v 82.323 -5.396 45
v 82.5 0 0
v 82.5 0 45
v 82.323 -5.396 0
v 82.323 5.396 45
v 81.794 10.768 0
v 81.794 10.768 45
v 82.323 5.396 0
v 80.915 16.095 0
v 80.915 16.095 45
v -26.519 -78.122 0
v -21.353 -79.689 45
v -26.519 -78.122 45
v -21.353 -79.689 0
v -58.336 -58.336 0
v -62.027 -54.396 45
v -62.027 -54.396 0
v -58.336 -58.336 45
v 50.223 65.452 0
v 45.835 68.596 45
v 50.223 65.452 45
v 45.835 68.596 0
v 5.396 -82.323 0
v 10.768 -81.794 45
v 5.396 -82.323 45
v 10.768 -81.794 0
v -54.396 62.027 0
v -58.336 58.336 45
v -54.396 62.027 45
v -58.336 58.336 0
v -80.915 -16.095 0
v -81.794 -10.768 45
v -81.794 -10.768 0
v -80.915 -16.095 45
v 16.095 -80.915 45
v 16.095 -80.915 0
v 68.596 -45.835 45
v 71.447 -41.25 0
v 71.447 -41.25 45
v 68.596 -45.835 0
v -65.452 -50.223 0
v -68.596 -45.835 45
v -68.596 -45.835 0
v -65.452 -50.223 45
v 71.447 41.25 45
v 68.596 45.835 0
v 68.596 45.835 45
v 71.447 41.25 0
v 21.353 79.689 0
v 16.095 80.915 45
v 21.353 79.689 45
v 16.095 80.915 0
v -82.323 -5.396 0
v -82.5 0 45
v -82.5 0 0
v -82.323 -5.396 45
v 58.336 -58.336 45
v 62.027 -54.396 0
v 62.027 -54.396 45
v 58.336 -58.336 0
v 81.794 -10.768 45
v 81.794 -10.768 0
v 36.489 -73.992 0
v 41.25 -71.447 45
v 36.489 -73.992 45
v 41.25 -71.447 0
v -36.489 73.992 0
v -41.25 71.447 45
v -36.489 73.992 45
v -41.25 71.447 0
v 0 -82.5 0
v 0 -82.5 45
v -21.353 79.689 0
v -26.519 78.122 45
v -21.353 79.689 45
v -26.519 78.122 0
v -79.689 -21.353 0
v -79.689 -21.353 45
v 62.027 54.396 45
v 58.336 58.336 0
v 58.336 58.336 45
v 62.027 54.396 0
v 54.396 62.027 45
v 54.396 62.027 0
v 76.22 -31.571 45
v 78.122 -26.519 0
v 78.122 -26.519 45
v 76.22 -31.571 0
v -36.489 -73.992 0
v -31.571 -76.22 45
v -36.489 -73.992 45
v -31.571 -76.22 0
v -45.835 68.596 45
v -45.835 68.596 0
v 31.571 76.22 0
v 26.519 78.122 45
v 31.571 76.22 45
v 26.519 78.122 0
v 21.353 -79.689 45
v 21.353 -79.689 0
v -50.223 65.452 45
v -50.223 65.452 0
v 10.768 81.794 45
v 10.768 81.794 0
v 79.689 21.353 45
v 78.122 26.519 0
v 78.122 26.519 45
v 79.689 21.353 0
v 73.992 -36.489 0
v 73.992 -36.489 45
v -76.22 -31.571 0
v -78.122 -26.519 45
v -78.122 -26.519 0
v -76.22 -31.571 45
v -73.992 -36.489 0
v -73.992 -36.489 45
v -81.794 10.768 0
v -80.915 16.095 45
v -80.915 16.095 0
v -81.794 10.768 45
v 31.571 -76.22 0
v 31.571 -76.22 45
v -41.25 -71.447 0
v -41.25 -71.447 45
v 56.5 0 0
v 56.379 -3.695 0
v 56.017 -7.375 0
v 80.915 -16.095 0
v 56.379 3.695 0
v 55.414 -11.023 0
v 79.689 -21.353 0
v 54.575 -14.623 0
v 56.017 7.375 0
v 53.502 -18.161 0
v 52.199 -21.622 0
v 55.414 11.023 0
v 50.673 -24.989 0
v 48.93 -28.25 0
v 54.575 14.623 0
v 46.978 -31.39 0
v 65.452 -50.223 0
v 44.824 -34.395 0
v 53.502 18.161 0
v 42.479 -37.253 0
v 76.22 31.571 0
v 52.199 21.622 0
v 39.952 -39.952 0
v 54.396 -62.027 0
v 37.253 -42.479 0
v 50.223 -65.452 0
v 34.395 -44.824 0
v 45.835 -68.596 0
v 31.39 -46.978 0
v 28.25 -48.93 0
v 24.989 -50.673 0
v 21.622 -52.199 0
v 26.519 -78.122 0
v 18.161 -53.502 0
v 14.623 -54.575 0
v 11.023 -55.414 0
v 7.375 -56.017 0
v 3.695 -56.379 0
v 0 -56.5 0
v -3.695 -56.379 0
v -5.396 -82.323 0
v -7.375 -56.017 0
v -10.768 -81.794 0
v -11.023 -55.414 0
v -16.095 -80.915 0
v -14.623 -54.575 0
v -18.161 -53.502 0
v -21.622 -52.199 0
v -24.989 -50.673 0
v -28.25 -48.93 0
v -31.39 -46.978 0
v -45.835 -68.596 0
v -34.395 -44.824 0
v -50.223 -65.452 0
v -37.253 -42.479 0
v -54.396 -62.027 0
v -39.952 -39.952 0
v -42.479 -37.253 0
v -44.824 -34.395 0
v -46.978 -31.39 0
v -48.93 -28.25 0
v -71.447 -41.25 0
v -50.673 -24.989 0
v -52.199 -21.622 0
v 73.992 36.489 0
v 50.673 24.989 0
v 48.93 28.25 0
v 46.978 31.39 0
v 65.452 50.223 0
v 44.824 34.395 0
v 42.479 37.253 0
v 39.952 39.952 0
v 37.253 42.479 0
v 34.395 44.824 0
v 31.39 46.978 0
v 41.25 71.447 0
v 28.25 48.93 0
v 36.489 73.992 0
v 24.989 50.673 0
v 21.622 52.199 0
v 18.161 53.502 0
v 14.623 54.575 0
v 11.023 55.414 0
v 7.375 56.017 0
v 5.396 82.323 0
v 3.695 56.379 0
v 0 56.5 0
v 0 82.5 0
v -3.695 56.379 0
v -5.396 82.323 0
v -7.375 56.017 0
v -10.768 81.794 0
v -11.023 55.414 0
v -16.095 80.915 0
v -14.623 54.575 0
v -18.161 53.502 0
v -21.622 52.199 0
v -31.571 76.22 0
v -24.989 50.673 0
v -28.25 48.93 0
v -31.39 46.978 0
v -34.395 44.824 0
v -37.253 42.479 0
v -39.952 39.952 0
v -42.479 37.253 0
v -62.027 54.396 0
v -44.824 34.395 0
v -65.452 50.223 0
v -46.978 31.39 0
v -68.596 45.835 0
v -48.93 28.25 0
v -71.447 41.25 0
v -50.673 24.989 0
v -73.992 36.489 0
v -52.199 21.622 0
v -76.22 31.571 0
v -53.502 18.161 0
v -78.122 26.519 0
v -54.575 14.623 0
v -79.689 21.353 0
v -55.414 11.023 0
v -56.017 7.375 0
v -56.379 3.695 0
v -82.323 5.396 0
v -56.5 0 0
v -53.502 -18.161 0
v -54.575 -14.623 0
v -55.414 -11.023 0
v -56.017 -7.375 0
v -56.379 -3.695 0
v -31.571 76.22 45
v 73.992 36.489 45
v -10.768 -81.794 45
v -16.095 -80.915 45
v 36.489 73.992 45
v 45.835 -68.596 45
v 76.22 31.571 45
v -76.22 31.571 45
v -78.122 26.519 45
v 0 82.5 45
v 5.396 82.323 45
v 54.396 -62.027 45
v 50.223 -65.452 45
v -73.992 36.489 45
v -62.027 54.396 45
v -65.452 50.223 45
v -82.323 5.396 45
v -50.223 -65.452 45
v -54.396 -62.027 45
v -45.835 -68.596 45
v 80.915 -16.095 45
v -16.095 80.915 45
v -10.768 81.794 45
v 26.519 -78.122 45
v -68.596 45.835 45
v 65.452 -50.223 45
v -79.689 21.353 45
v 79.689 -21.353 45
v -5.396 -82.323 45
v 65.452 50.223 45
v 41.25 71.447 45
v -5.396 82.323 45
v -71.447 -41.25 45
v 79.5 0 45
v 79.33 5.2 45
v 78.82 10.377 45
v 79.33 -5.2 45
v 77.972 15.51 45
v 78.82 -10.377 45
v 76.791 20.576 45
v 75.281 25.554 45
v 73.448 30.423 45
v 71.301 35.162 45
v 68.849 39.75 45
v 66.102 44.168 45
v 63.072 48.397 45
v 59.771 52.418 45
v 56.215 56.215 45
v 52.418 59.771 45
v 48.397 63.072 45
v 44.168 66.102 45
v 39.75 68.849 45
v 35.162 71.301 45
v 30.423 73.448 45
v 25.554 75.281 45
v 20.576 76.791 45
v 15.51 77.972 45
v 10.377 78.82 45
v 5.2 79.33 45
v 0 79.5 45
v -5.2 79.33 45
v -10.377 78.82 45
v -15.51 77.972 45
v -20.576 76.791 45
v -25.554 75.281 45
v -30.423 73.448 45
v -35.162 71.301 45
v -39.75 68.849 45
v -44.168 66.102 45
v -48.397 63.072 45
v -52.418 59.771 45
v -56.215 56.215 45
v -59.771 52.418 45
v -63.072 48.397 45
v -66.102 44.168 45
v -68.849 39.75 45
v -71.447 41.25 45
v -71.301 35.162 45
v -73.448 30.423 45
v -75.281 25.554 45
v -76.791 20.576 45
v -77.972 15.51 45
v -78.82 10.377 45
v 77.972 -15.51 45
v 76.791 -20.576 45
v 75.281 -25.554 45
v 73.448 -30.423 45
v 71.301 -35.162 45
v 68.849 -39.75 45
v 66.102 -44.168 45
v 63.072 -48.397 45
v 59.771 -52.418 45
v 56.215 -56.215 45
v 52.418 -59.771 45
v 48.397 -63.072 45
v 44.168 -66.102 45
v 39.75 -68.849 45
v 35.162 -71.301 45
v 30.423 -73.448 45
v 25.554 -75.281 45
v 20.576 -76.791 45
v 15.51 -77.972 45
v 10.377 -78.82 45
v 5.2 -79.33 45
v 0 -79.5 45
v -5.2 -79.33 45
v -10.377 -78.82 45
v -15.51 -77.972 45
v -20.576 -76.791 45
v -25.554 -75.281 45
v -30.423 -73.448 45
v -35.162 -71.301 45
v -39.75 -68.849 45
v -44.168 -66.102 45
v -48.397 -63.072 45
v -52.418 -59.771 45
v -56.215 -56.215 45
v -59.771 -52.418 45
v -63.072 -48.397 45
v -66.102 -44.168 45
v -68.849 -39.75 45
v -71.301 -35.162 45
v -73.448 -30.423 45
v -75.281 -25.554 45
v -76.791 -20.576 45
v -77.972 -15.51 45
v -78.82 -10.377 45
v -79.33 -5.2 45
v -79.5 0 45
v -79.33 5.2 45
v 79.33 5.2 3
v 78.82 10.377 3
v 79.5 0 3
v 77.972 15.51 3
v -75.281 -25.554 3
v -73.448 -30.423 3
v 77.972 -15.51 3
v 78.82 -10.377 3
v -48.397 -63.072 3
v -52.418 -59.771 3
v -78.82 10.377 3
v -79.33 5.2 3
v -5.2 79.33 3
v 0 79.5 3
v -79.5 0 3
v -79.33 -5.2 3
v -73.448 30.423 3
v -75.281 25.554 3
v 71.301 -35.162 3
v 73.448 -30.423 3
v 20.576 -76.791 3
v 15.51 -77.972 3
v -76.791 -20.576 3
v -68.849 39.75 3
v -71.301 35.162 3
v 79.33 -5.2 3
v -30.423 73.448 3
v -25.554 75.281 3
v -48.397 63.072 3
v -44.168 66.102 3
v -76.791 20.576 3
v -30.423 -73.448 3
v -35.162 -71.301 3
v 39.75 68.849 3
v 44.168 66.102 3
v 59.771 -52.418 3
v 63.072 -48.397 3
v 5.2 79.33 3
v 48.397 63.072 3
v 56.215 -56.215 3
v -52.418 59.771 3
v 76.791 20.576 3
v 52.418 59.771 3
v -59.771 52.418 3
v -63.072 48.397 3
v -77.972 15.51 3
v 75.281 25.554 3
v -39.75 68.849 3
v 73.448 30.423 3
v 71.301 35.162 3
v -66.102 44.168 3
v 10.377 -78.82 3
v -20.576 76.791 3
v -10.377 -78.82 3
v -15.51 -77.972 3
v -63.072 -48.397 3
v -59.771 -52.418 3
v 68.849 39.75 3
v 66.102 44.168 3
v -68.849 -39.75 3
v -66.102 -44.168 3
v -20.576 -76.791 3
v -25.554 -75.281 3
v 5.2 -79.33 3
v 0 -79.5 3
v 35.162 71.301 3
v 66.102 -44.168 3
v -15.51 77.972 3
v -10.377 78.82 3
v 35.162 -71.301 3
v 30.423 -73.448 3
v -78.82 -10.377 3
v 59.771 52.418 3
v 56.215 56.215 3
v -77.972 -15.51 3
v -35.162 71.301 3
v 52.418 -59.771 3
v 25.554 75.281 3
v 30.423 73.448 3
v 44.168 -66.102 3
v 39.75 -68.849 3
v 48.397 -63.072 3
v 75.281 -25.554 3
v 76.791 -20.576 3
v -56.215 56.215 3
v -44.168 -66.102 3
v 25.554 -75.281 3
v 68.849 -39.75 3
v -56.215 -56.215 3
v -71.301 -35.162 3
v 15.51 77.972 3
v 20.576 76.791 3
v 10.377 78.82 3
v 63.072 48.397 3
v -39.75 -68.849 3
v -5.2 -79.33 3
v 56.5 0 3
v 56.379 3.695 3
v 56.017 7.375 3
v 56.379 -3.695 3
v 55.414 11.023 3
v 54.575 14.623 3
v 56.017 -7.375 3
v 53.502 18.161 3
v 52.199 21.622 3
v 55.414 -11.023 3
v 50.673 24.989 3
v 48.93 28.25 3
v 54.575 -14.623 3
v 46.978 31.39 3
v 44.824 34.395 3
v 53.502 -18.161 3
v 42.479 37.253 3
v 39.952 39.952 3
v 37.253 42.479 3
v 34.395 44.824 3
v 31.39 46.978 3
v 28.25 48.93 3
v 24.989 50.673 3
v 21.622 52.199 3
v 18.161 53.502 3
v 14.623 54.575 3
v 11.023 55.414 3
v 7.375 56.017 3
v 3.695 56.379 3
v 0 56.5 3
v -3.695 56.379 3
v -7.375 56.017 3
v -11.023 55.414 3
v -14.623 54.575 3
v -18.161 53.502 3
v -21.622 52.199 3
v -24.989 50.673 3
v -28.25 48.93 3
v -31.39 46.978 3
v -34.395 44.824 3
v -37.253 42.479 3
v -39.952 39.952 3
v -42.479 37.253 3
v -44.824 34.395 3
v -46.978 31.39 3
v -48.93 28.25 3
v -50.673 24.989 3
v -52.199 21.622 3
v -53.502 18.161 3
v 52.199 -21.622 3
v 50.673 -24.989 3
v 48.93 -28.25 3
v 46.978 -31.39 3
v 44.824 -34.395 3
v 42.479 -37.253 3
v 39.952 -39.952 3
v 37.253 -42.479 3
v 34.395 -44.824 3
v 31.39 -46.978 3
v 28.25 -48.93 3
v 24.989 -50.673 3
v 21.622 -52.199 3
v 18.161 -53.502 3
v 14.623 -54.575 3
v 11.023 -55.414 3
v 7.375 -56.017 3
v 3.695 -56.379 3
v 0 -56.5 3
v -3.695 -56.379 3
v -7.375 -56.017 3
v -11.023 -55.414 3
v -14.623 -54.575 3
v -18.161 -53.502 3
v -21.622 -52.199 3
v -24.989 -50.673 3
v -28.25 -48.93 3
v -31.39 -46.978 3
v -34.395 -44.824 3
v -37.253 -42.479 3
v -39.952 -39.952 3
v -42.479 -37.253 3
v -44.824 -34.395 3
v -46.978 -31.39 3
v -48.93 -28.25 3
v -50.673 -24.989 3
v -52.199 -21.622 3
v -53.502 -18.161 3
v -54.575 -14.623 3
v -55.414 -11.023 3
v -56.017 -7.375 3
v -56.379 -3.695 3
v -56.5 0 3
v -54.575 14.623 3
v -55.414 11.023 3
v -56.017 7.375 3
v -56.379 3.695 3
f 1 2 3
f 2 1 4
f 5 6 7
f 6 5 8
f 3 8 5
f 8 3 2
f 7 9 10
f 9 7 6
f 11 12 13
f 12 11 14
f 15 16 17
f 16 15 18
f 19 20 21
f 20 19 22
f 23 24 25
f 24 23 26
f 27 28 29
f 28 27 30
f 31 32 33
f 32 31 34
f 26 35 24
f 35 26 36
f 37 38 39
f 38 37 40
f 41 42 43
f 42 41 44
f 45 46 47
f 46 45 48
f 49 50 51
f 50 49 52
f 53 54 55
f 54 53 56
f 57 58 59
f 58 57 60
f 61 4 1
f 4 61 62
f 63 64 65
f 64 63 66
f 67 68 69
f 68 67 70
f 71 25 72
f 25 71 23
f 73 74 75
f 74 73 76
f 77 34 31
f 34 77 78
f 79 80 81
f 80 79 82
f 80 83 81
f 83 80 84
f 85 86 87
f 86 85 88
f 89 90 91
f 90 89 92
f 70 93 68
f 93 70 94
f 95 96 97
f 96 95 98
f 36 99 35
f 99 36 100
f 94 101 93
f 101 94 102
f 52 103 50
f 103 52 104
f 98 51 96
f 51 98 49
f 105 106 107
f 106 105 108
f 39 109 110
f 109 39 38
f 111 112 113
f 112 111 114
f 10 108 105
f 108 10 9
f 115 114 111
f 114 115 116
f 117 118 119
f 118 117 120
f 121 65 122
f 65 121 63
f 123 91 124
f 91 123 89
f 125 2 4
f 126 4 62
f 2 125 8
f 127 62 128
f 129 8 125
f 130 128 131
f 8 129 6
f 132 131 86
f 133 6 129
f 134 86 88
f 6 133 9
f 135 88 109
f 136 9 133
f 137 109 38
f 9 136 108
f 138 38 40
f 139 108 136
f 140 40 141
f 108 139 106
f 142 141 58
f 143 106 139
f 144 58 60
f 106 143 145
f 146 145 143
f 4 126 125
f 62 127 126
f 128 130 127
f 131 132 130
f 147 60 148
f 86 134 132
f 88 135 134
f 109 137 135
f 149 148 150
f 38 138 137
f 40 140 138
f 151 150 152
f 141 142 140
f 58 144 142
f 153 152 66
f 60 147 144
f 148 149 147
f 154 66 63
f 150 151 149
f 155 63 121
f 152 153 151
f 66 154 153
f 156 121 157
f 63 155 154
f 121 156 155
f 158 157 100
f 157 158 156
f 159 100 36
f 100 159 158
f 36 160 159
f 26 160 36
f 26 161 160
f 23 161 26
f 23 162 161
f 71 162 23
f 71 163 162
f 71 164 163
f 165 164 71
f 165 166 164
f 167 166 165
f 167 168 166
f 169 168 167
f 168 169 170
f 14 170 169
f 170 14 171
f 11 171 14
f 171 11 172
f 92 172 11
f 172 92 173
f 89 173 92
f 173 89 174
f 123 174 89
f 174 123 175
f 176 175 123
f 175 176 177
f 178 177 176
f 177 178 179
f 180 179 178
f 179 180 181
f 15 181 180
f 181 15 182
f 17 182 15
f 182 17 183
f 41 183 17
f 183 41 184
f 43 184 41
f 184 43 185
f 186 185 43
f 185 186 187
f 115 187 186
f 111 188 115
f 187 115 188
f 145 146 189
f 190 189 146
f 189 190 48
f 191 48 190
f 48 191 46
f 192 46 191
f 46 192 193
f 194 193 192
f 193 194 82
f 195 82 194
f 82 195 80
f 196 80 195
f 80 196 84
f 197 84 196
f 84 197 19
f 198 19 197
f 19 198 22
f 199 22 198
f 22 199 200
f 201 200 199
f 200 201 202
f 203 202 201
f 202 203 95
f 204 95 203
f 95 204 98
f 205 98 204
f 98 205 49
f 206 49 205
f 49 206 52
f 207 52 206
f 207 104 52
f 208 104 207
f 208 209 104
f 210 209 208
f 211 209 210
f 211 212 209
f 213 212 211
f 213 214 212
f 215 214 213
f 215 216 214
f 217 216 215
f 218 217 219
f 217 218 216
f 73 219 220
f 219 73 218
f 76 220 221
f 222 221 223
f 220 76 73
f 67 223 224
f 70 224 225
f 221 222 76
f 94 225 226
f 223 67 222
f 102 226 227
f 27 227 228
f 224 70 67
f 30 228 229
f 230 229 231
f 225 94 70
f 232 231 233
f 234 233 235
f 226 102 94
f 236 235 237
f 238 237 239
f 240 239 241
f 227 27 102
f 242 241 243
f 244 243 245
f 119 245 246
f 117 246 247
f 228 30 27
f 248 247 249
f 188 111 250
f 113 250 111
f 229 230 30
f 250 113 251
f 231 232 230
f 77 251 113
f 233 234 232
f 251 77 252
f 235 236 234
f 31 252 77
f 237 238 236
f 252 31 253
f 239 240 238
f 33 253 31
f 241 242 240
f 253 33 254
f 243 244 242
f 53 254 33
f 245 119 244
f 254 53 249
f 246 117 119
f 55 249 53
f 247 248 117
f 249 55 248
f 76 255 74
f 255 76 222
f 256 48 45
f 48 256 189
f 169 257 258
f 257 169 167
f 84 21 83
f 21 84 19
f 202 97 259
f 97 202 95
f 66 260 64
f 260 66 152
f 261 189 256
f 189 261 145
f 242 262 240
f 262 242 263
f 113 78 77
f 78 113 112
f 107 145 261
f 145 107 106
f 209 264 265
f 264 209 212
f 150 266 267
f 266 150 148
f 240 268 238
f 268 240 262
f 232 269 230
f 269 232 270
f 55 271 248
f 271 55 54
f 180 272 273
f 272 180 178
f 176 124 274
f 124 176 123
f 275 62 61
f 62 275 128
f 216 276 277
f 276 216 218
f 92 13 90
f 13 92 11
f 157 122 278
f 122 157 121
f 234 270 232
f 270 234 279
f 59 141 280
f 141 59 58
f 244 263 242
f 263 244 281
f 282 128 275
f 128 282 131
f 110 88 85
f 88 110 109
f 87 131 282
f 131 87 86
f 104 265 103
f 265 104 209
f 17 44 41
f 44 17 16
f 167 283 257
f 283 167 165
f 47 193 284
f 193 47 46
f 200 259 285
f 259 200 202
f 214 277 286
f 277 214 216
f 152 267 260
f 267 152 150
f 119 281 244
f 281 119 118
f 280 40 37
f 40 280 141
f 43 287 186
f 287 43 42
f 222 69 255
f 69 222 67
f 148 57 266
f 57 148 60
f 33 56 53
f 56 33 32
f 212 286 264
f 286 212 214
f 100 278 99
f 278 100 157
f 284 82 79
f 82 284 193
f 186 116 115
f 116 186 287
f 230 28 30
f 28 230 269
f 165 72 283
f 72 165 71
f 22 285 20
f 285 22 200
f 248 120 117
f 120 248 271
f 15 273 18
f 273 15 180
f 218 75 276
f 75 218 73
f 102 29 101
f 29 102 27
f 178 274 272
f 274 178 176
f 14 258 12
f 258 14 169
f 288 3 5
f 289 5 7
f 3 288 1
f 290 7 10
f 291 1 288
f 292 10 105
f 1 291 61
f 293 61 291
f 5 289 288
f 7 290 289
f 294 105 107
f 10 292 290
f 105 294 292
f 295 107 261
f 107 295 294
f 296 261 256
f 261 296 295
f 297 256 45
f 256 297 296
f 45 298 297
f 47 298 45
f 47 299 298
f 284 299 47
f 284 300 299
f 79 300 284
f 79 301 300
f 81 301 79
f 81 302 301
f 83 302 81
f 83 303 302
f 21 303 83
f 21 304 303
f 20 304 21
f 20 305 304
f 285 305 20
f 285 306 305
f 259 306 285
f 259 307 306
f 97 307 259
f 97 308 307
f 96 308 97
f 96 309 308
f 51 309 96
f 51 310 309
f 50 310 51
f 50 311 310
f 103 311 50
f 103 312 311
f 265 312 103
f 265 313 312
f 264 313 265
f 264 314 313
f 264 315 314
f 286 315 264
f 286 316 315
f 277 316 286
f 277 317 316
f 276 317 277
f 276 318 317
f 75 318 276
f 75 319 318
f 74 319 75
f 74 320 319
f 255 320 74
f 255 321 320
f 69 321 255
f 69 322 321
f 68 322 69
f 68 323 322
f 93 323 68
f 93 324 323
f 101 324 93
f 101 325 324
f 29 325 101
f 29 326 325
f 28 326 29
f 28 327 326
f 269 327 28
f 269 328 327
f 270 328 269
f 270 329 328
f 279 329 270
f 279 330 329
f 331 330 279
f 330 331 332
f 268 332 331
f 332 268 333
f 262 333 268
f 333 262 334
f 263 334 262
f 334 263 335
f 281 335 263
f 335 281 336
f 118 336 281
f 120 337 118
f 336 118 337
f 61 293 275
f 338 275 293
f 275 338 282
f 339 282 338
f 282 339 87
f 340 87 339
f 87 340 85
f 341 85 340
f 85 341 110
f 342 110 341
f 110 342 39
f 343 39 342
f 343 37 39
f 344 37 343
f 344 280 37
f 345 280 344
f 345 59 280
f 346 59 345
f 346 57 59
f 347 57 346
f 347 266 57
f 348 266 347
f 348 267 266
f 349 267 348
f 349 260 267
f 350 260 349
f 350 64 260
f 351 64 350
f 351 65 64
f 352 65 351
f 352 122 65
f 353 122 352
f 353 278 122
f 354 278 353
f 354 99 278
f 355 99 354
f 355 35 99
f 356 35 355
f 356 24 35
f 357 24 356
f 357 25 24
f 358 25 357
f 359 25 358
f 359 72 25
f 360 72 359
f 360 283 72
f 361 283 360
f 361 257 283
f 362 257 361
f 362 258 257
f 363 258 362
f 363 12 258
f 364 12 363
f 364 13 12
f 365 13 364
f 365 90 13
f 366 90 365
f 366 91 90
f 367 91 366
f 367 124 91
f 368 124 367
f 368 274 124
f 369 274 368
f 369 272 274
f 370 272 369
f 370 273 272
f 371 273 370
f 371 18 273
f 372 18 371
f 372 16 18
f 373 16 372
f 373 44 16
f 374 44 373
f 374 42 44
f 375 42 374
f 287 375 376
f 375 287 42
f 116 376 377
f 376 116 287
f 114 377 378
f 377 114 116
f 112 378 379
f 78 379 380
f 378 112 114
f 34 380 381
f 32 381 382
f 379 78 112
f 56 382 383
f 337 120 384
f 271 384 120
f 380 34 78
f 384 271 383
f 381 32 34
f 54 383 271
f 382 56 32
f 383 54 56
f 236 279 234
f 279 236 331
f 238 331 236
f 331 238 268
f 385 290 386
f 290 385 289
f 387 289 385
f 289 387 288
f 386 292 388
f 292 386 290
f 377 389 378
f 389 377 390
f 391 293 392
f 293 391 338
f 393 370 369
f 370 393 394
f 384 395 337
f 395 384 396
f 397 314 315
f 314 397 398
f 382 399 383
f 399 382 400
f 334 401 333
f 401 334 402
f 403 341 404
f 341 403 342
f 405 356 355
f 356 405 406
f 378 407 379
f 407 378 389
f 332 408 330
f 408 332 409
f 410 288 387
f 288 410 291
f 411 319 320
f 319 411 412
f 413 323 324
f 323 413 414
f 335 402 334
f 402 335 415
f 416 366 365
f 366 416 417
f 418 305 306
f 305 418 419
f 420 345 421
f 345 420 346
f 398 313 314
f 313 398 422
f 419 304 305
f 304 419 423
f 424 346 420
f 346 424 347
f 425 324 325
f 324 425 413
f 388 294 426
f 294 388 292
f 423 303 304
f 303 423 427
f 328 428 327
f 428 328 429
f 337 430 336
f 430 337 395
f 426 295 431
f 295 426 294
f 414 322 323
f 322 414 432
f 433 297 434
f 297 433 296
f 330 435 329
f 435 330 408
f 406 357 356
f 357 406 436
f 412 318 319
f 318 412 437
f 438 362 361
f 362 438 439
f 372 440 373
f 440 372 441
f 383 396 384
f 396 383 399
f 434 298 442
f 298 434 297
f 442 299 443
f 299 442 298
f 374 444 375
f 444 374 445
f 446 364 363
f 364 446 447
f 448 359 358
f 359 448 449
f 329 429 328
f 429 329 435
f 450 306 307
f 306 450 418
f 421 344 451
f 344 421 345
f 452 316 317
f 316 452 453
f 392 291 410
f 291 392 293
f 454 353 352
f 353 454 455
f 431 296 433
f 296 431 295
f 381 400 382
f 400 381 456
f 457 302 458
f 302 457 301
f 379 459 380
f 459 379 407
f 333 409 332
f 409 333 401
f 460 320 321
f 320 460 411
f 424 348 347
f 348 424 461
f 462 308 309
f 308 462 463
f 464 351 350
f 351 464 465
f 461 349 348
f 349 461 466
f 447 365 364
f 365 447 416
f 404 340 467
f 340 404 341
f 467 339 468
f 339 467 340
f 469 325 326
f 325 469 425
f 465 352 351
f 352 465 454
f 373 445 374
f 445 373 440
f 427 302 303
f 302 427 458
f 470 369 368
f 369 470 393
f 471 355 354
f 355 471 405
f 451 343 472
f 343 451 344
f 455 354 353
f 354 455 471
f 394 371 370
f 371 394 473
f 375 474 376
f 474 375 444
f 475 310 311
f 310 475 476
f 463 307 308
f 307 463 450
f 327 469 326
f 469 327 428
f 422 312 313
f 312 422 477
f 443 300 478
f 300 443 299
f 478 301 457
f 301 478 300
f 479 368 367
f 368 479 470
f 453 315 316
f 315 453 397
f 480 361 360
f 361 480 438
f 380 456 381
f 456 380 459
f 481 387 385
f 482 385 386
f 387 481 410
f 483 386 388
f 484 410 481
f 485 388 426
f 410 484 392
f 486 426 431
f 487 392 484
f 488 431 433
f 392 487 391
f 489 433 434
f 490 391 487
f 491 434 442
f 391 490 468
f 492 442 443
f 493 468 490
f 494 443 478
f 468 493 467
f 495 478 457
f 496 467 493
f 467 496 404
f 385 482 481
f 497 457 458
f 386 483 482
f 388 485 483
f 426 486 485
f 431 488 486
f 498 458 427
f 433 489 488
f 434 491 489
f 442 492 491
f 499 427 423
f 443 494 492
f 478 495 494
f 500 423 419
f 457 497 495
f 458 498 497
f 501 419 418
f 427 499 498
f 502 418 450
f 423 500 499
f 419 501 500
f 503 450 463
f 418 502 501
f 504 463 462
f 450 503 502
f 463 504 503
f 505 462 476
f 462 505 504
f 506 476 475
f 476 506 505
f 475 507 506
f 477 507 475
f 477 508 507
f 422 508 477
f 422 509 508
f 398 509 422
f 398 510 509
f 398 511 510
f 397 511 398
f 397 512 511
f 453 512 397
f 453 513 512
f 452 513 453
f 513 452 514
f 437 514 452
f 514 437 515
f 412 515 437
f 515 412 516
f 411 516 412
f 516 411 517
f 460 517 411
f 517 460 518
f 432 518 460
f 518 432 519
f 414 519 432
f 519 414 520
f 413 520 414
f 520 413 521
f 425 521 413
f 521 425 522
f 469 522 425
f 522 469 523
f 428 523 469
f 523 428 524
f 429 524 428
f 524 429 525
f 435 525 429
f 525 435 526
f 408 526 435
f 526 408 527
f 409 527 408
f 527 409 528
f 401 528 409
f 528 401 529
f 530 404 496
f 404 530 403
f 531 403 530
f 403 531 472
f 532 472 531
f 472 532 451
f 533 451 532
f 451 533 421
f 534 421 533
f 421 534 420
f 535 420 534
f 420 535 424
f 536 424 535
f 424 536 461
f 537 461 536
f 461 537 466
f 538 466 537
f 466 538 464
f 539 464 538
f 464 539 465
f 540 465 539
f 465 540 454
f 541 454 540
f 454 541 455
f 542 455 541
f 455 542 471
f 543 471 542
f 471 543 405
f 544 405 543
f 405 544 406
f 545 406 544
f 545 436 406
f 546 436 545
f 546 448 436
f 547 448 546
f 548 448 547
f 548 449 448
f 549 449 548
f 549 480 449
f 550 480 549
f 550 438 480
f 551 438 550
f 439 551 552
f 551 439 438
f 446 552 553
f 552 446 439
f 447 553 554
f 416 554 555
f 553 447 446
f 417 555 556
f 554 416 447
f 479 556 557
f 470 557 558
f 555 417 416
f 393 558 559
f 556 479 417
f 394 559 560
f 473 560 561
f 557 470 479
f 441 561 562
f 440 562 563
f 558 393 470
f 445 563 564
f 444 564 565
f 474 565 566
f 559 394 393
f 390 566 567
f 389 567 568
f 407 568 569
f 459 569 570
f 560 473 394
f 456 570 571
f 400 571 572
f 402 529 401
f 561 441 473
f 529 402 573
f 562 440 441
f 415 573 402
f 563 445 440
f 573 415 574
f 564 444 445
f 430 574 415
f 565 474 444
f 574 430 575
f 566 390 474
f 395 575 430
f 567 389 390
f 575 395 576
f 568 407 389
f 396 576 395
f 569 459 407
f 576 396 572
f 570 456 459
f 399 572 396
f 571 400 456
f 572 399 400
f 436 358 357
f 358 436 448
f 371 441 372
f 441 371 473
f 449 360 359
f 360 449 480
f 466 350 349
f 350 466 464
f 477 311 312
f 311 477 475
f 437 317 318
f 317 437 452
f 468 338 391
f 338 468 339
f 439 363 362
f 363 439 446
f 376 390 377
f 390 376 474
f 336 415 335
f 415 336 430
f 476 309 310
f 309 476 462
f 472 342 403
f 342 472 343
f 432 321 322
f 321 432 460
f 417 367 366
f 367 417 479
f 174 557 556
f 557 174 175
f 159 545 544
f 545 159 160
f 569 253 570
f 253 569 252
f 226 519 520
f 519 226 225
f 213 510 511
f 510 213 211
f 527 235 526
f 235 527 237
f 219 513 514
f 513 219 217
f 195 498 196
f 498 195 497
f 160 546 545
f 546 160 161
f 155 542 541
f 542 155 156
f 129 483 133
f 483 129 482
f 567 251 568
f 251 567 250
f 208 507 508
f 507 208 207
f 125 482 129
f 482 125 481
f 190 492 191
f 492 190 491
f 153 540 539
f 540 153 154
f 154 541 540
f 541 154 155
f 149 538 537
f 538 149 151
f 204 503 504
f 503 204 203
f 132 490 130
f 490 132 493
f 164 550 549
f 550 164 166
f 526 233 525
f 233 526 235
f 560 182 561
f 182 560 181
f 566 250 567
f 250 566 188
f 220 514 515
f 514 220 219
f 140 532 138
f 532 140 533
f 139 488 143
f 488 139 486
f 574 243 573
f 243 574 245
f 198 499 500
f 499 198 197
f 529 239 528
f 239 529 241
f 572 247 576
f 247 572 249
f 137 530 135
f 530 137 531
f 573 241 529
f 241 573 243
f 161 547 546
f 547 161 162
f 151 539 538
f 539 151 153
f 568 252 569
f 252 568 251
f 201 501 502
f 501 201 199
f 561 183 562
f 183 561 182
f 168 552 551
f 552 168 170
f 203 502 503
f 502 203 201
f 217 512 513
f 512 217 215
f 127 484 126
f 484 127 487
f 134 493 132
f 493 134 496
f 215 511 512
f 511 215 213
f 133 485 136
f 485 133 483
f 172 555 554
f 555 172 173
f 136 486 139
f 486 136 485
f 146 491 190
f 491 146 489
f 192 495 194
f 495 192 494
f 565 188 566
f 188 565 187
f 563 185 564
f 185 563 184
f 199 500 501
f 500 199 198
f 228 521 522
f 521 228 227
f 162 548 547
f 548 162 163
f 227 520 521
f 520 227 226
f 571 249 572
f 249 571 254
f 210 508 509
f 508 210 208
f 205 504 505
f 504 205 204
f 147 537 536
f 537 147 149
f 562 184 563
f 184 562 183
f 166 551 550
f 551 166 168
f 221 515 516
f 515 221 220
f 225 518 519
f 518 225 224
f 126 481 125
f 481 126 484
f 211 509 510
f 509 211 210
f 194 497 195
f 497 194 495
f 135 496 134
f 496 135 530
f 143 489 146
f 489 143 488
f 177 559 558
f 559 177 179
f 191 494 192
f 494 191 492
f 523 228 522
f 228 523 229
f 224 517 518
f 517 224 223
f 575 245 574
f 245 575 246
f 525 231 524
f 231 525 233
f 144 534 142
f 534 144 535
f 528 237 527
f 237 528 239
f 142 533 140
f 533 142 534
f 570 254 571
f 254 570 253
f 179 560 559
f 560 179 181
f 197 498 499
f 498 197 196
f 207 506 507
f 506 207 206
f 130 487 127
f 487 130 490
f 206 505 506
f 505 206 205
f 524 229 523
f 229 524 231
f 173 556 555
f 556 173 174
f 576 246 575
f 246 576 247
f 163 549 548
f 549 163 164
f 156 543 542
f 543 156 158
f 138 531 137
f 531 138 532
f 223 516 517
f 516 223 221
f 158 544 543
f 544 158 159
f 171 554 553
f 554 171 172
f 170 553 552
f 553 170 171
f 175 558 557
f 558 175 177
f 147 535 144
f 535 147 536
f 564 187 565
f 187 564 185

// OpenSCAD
// file: params.scad
// ==========================================
// Coffee Cooler Parameters / コーヒークーラー共通パラメータ
// ==========================================

// --- Global Settings / 全体設定 ---
$fn = 96;           // Rendering resolution / 円や曲面の分割数
wall = 3;           // Standard wall thickness / 標準の壁厚
clearance = 0.4;    // General mechanical clearance / 嵌合や穴用の基本クリアランス

// --- Main Body Sections / 本体の主要寸法 ---
body_outer_d = 165;  // Outer diameter of the main cylindrical body / 本体円筒部の外径
top_ring_h = 20;     // Height of the top ring that holds the sieve / ザル受け上部リングの高さ
plenum_h = 45;       // Height of the air plenum section / ザル下の整流空間の高さ
base_h = 80;         // Height of the base section (housing the fan) / ファンを収めるベース部の高さ

// --- Sieve & Gasket (Top Section) / ザルとガスケット ---
// Parameters for the coffee sieve/filter / コーヒー用うらごしザルの寸法
sieve_ring_outer_d = 156;                 // ザル付属金属リングの外径
sieve_outer_d = sieve_ring_outer_d;       // mock表示用のザル外径。実寸基準はsieve_ring_outer_d
sieve_h = 55;                             // ザル全体の高さ
sieve_ring_seat_d = sieve_ring_outer_d + 0.8;  // top_ring側のザル受けポケット径
sieve_ring_seat_depth = 10;               // ザル受けポケットの深さ
sieve_opening_d = 148;                    // top_ring中央の吸気開口径
sieve_loop_relief_w = 30;                 // 未使用: ザル横リング逃げの幅
sieve_loop_relief_d = 7;                  // 未使用: ザル横リング逃げの奥行き
sieve_loop_relief_h = 12;                 // 未使用: ザル横リング逃げの高さ
sieve_seat_d = sieve_ring_seat_d;         // 互換用: ザル受け径
sieve_lip_h = sieve_ring_seat_depth;      // 互換用: ザル受けリップ高さ

// Gasket parameters (intended for TPU printing) / TPUガスケット寸法
gasket_outer_d = sieve_ring_seat_d - 0.4;  // TPUガスケットの外径
gasket_inner_d = sieve_opening_d + 1.0;    // TPUガスケットの内径
gasket_h = 1.2;                            // TPUガスケットの厚み
gasket_loop_relief_w = sieve_loop_relief_w + 2;  // 未使用: 旧切り欠き用の幅
gasket_loop_relief_d = sieve_loop_relief_d + 1;  // 未使用: 旧切り欠き用の奥行き

// --- Fan & Mount / 120mmファンと固定部 ---
// Standard 120mm fan parameters / 一般的な120mm PCファン寸法
fan_size = 120;              // ファン外形サイズ
fan_clearance = 1.0;         // ファン外形まわりの逃げ
fan_cutout_d = 113;          // ファン開口径
fan_hole_pitch = 105;        // ファン固定穴ピッチ
fan_screw_d = 4.5;           // ファン固定ネジの通し穴径
fan_thickness = 25;          // ファン厚み
fan_plate_thickness = 4;     // ファン取付プレートの厚み
fan_seal_lip_h = 2;          // ファン開口まわりのシールリップ高さ
fan_seal_lip_w = 7;          // ファン開口まわりのシールリップ幅

// --- Ventilation Slots / 側面排気スリット ---
// Air exhaust slots on the base / ベース側面の排気口寸法
vent_slot_w = 34;       // 排気スリットの横幅
vent_slot_h = 9;        // 排気スリットの高さ
vent_row_pitch = vent_slot_h + 6;  // 排気スリットの段間ピッチ
vent_rows = 4;          // 排気スリットの段数
vent_count = 8;         // 円周方向の排気スリット数
vent_center_z = base_h / 2;  // 排気スリット群の中心高さ

// --- Electronics Bay / 電装室 ---
// Internal space for PWM controller and DC barrel jack. / PWMコントローラとDC電源ジャックの収納部
electronics_box_d = 32;  // 電装室の奥行き
electronics_box_w = 80;  // 電装室の幅
electronics_box_h = 45;  // 電装室の高さ
// main file
include <params.scad>

module plenum() {
    difference() {
        cylinder(h = plenum_h, d = body_outer_d);

        translate([0, 0, wall])
            cylinder(h = plenum_h, d = body_outer_d - wall * 2);

        translate([0, 0, -1])
            cylinder(h = wall + 2, d = fan_cutout_d);
    }
}

plenum();
